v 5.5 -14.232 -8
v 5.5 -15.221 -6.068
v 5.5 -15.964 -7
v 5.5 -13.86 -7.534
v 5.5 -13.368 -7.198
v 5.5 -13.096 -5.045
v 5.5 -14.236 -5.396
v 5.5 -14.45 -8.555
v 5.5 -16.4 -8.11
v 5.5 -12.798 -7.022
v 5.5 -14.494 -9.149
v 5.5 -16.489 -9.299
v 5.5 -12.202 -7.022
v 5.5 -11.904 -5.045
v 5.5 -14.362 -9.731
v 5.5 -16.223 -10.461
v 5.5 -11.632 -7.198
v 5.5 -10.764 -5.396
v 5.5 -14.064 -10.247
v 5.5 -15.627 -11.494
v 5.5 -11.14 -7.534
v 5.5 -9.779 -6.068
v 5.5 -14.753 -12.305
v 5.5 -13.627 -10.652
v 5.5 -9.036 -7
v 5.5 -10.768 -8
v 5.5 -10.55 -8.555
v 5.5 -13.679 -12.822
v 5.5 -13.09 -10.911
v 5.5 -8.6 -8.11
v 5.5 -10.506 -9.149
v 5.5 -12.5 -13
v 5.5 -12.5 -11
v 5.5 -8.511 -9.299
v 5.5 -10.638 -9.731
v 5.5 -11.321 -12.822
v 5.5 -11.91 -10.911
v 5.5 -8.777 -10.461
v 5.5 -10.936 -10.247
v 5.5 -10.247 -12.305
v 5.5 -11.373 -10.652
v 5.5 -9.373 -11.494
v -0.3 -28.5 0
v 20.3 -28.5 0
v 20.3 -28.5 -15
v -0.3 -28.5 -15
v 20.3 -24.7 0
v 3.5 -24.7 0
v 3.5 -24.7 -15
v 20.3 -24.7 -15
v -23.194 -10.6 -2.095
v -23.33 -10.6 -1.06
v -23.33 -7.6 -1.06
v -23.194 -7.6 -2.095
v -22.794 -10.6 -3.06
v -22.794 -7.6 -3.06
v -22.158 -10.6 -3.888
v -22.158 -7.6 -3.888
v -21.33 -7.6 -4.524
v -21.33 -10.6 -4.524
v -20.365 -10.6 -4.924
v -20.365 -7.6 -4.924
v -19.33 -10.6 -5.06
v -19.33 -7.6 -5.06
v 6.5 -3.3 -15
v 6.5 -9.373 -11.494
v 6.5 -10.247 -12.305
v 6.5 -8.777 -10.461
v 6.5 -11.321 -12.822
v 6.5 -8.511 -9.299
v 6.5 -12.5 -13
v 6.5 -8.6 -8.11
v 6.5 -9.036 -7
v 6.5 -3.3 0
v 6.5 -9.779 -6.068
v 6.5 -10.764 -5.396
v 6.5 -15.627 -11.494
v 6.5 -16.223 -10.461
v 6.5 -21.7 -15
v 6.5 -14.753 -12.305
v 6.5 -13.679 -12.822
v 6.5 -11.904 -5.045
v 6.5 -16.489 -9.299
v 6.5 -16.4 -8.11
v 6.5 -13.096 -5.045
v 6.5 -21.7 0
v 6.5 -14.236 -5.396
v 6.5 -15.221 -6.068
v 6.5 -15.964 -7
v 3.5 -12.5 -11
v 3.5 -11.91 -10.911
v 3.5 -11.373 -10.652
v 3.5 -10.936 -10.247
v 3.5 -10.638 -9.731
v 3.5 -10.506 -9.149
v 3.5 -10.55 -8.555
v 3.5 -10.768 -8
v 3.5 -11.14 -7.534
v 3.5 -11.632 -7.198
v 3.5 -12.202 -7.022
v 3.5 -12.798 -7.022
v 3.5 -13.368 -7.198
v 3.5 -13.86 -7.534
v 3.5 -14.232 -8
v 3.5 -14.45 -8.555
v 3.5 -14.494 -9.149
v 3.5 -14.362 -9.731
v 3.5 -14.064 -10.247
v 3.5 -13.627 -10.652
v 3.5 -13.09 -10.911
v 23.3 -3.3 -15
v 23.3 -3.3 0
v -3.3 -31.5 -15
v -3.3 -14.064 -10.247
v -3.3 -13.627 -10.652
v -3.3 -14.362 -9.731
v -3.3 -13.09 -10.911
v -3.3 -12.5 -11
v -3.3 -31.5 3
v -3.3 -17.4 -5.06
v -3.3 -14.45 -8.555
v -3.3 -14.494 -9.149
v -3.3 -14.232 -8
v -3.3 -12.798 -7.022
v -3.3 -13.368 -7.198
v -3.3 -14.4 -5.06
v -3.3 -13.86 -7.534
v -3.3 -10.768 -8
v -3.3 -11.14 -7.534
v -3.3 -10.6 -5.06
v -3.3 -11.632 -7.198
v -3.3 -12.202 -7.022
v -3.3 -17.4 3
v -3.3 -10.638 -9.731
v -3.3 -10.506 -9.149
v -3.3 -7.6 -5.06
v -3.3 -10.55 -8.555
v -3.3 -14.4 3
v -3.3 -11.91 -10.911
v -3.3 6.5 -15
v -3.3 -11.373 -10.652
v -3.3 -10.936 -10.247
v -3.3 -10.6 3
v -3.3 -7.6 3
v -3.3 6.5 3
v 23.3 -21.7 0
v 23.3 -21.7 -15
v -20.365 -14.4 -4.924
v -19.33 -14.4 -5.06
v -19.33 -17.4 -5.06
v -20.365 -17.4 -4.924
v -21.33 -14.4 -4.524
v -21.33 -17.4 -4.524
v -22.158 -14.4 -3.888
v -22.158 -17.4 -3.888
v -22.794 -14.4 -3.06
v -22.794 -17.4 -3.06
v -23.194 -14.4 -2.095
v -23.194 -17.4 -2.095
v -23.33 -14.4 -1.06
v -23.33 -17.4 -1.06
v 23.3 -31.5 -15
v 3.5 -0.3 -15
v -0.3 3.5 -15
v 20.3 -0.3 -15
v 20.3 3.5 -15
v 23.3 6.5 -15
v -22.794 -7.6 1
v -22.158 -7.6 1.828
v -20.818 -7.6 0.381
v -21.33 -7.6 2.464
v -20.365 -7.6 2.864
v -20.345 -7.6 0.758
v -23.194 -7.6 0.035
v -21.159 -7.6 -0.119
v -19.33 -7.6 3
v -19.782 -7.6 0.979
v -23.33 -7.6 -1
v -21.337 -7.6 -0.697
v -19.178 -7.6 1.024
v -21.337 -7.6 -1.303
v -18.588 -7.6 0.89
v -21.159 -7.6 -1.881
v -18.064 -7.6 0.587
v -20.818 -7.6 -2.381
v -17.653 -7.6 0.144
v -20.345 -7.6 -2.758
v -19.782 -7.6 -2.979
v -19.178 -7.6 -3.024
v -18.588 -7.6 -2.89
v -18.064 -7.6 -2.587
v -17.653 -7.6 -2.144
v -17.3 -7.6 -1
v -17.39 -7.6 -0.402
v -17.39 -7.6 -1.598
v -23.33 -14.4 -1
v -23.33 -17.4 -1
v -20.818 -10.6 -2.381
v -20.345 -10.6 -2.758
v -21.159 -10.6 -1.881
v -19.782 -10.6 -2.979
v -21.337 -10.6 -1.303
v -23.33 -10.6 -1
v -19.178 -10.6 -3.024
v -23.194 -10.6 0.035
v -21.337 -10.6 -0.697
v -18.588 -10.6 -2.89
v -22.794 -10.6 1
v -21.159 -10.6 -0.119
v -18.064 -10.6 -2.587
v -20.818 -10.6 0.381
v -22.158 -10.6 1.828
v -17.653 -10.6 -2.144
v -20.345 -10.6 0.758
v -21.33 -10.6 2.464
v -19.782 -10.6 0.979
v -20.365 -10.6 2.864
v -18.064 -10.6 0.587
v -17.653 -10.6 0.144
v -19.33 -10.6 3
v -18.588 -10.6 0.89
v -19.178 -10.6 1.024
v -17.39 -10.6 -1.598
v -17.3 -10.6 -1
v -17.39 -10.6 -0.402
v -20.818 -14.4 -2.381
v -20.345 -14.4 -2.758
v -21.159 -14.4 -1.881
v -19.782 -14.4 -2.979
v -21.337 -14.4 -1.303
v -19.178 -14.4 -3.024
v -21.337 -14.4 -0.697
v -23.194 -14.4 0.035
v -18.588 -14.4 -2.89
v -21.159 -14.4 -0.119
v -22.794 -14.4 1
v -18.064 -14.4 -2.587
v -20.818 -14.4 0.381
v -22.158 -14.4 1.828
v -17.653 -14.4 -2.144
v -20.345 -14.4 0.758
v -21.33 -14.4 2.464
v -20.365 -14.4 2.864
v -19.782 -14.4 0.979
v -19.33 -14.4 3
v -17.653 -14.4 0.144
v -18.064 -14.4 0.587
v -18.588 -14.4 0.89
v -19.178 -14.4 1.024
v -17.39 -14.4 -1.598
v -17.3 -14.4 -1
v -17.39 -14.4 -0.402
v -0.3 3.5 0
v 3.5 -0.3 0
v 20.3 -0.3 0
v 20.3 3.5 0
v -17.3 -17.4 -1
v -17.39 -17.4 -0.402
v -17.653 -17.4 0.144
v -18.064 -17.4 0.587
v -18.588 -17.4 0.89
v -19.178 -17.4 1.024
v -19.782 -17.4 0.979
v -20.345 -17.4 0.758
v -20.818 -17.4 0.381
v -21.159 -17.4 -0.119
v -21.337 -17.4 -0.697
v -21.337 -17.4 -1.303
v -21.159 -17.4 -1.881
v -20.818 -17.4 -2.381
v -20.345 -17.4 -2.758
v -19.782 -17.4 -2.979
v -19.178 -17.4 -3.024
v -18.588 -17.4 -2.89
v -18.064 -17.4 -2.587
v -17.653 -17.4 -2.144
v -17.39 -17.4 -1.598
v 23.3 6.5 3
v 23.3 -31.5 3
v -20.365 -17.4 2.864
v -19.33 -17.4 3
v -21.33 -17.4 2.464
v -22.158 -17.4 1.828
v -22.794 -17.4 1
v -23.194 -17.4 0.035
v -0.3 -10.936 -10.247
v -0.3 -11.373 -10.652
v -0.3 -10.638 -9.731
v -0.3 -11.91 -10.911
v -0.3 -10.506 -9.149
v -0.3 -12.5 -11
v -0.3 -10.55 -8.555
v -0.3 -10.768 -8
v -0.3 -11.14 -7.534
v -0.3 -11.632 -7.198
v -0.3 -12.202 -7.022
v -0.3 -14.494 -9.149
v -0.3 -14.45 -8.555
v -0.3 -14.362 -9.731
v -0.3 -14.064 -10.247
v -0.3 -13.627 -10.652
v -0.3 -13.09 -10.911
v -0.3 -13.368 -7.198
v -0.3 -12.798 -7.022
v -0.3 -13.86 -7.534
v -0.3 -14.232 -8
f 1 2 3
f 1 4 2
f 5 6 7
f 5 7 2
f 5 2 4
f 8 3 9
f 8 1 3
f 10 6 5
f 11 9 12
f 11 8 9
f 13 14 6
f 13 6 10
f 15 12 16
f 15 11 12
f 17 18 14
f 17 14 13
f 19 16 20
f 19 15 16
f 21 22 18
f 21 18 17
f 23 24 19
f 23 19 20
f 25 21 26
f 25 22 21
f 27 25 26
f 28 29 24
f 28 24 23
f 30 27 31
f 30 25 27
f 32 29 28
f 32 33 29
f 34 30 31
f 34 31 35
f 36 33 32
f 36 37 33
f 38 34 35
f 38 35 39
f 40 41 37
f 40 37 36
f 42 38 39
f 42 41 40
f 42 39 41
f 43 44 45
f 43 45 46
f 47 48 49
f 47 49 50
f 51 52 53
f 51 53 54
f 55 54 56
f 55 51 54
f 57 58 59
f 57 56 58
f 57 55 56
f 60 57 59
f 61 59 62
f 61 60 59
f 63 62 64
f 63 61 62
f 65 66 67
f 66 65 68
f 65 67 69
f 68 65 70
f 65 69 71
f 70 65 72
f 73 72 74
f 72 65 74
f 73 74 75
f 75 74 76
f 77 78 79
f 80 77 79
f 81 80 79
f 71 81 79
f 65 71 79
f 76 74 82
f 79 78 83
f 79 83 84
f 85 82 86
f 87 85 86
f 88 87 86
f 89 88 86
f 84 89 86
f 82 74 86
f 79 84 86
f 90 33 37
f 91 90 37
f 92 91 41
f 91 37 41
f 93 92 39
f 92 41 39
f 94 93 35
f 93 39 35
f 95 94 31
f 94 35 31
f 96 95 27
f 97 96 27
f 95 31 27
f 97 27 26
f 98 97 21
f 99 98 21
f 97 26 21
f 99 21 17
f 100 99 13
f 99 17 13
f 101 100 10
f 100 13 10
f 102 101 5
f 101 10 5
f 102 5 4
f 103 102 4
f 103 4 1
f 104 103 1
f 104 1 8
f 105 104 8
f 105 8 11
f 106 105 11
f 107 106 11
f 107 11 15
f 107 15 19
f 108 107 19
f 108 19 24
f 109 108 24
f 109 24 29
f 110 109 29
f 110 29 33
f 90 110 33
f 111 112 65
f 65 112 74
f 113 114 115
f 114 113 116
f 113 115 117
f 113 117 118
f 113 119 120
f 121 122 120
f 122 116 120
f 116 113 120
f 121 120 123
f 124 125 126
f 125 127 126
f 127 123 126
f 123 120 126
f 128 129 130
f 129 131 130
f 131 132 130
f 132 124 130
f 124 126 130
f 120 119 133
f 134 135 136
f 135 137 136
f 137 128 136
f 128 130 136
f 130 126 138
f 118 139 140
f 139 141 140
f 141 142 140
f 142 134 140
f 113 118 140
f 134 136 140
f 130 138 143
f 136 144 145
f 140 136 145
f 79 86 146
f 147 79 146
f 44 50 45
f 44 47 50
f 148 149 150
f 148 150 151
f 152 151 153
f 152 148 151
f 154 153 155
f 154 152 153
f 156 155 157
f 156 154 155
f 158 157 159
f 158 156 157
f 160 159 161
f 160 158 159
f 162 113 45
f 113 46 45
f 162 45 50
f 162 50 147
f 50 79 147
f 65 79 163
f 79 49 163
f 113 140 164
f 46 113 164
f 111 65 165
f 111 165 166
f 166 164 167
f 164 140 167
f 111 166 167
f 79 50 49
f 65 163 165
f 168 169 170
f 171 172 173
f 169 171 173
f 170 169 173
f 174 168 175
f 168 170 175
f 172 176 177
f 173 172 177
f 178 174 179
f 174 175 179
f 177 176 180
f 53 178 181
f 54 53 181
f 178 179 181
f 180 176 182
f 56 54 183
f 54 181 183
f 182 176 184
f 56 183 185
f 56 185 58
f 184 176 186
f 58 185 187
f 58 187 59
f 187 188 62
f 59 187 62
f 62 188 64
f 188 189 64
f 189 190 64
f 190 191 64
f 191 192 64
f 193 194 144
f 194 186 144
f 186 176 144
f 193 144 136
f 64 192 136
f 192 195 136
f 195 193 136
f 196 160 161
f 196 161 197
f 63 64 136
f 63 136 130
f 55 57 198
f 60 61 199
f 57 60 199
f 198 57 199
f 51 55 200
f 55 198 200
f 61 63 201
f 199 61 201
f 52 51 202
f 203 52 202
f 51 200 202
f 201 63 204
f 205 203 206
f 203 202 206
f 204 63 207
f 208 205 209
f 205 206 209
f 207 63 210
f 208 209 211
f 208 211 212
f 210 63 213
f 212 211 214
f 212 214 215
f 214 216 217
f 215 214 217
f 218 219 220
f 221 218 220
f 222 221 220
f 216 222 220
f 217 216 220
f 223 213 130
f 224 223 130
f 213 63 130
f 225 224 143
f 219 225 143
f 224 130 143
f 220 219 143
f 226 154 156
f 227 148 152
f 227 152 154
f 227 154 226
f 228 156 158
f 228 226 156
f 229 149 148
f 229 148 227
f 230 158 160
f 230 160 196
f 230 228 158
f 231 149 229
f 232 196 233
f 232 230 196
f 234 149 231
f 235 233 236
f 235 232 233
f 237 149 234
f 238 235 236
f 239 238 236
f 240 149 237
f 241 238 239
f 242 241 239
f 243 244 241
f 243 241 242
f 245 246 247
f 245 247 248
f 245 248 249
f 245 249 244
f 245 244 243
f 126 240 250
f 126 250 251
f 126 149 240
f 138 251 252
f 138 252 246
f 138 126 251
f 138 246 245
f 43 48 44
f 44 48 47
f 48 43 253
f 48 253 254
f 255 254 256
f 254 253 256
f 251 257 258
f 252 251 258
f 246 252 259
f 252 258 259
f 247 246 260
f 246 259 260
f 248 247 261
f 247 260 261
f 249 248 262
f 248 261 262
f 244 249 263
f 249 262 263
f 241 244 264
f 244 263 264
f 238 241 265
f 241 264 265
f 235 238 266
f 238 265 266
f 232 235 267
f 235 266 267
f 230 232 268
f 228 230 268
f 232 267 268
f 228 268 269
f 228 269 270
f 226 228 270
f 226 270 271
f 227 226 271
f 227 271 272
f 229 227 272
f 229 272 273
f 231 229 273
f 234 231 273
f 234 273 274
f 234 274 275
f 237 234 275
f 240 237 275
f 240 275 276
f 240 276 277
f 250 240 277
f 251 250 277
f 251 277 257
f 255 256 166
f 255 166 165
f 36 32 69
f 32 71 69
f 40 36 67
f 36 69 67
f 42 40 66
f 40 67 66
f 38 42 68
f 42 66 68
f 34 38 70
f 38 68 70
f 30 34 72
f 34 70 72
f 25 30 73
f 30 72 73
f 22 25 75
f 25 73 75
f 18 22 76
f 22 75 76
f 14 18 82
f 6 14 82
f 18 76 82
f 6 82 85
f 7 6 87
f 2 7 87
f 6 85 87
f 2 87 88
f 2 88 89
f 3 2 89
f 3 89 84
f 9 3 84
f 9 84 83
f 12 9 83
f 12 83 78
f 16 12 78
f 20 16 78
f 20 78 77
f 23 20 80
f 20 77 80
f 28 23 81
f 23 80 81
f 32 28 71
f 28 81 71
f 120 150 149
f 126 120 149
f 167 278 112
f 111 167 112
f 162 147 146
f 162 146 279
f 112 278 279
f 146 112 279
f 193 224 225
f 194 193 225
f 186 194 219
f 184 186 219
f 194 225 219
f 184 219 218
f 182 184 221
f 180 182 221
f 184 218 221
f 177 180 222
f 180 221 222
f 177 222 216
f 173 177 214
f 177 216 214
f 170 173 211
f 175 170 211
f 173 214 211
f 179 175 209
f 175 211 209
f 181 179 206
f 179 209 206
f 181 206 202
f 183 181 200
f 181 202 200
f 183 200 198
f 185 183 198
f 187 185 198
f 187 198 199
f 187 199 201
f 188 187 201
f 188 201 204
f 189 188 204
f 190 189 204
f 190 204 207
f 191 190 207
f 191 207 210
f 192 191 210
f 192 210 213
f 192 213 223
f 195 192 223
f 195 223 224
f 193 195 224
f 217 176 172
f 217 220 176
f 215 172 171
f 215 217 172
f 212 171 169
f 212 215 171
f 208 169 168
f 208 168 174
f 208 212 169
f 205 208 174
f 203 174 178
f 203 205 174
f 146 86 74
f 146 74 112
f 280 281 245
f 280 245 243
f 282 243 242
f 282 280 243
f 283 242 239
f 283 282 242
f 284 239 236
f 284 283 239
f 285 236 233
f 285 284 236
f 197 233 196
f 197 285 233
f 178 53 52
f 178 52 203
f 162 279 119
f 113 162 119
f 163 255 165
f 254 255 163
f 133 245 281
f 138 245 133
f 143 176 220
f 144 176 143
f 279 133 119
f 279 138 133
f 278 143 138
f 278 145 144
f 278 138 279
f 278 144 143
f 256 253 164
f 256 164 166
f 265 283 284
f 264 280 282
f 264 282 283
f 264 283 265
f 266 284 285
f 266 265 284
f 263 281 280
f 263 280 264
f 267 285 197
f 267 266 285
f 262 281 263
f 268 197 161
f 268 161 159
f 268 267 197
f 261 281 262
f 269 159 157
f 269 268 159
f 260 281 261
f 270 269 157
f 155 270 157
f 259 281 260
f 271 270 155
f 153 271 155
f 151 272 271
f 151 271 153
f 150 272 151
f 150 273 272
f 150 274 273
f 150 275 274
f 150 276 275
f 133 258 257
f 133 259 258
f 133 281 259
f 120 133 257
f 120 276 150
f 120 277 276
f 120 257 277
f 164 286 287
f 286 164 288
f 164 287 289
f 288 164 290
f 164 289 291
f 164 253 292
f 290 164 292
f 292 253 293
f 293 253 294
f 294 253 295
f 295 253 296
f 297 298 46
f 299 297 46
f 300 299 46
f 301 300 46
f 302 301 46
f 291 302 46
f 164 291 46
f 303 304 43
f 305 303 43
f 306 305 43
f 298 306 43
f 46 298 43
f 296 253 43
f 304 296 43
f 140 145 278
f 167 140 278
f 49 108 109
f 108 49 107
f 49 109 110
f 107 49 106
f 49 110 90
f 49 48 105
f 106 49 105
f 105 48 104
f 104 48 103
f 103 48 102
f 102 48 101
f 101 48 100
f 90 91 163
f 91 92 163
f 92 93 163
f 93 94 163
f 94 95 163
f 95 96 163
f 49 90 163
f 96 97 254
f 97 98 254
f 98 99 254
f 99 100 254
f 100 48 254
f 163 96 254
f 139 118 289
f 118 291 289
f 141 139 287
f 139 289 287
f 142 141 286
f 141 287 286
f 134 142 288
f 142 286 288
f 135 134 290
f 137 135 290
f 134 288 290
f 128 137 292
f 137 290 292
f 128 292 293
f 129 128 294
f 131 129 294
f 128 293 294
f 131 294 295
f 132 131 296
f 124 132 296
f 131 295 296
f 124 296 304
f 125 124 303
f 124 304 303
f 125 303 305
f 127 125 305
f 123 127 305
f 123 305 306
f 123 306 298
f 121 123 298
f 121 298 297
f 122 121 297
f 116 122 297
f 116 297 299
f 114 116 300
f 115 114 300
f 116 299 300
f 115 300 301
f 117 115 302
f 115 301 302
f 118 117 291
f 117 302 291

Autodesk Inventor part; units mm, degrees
ref_plane "YZ Plane" through (0, 0, 0) normal (1, 0, 0) x (0, 1, 0)
ref_plane "XZ Plane" through (0, 0, 0) normal (0, 1, 0) x (-1, 0, 0)
ref_plane "XY Plane" through (0, 0, 0) normal (0, 0, 1) x (1, 0, 0)
sketch "Sketch1" plane through (0, 0, 0) normal (0, 0, 1) x (1, 0, 0)
  line L0 (0, 0) -> (20, 0) projected
  line L1 (20, 0) -> (20, 3.2) projected
  line L2 (0, 3.2) -> (20, 3.2) projected
  line L3 (0, 0) -> (0, 3.2) projected
  line L4 (20, -25) -> (0, -25) projected
  line L5 (0, -25) -> (0, -28.2) projected
  line L6 (20, -28.2) -> (0, -28.2) projected
  line L7 (20, -25) -> (20, -28.2) projected
  line L8 (3.2, -25) -> (3.2, 0) projected
  line L9 (0, -25) -> (0, 0) projected
  line L10 (-0.3, -0.3) -> (-0.3, 3.5)
  line L11 (-0.3, 3.5) -> (20.3, 3.5)
  line L12 (20.3, 3.5) -> (20.3, -0.3)
  line L13 (20.3, -24.7) -> (20.3, -28.5)
  line L14 (20.3, -28.5) -> (-0.3, -28.5)
  line L15 (-0.3, -28.5) -> (-0.3, -24.7)
  line L16 (3.5, -24.7) -> (3.5, -0.3)
  line L17 (-0.3, -0.3) -> (-0.3, -24.7)
  line L18 (20.3, -0.3) -> (3.5, -0.3)
  line L19 (3.5, -24.7) -> (20.3, -24.7)
  line L20 (6.5, -3.3) -> (6.5, -21.7)
  line L21 (6.5, -21.7) -> (23.3, -21.7)
  line L22 (23.3, -21.7) -> (23.3, -31.5)
  line L23 (23.3, -31.5) -> (-3.3, -31.5)
  line L24 (-3.3, -31.5) -> (-3.3, -24.7)
  line L25 (-3.3, -24.7) -> (-3.3, -0.3)
  line L26 (-3.3, -0.3) -> (-3.3, 6.5)
  line L27 (-3.3, 6.5) -> (23.3, 6.5)
  line L28 (23.3, 6.5) -> (23.3, -3.3)
  line L29 (23.3, -3.3) -> (6.5, -3.3)
  dimension "d2" = 0.3
  dimension "d3" = 0.3
  dimension "d4" = 0.3
  dimension "d5" = 24.4
  dimension "d6" = 3.8
  dimension "d7" = 3
extrude "Extrusion1" add sketch "Sketch1" against normal blind 15 contours L20 L21 L22 L23 L24 L25 L26 L27 L28 L29
sketch "Sketch4" plane through (0, 0, 0) normal (0, 0, 1) x (1, 0, 0)
  line L0 (23.3, -3.3) -> (23.3, 6.5) projected
  line L1 (23.3, 6.5) -> (-3.3, 6.5) projected
  line L2 (23.3, -3.3) -> (6.5, -3.3) projected
  line L3 (6.5, -3.3) -> (6.5, -21.7) projected
  line L4 (6.5, -21.7) -> (23.3, -21.7) projected
  line L5 (-3.3, -0.3) -> (-3.3, 6.5) projected
  line L6 (-3.3, -31.5) -> (23.3, -31.5) projected
  line L7 (23.3, -31.5) -> (23.3, -21.7) projected
  line L8 (23.3, -21.7) -> (6.5, -21.7) projected
  line L9 (23.3, 6.5) -> (23.3, -3.3) projected
  line L10 (23.3, -3.3) -> (23.3, 6.5)
  line L11 (-3.3, -31.5) -> (-3.3, 6.5) projected
  line L12 (23.3, 6.5) -> (-3.3, 6.5)
  line L13 (-3.3, 6.5) -> (-3.3, -31.5)
  line L14 (23.3, -31.5) -> (-3.3, -31.5) projected
  line L15 (-3.3, -31.5) -> (23.3, -31.5)
  line L16 (23.3, -21.7) -> (23.3, -31.5) projected
  line L17 (23.3, -31.5) -> (23.3, -21.7)
  line L18 (6.5, -3.3) -> (6.5, -21.7) projected
  line L19 (23.3, -3.3) -> (6.5, -3.3) projected
  line L20 (6.5, -3.3) -> (23.3, -3.3) projected
  line L21 (23.3, -3.3) -> (23.3, -21.7)
  point P0 (0, 0)
extrude "Extrusion3" add sketch "Sketch4" along normal blind 3
sketch "Sketch5" plane through (6.5, -21.7, -15) normal (1, 0, 0) x (0, 0, -1)
  line L0 (0, 18.4) -> (0, 0) projected
  line L1 (-15, 18.4) -> (0, 18.4) projected
  line L2 (-15, 0) -> (0, 0) projected
  line L3 (-15, 0) -> (-15, 18.4) projected
  circle A0 centre (-6, 9.2) radius 2
  circle A1 centre (-6, 9.2) radius 4
  point P0 (-15, 21.7)
  dimension "d14" = 4
  dimension "d15" = 6
  dimension "d16" = 8
  dimension "d17" = 9.2
extrude "Extrusion4" cut sketch "Sketch5" against normal blind 1 contours A1
extrude "Extrusion5" cut sketch "Sketch5" against normal blind 80 contours A0
sketch "Sketch16" plane through (-3.3, -31.5, -15) normal (-1, 0, 0) x (0, 0, 1)
  line L0 (18, 38) -> (18, 0) projected
  line L1 (0, 0) -> (18, 0) projected
  line L2 (18, 0) -> (18, 38) projected
  line L3 (18, 19) -> (0, 19) construction
  line L4 (0, 6.8) -> (0, 31.2) projected
  line L5 (18, 17.1) -> (18, 14.1)
  line L6 (18, 14.1) -> (9.94, 14.1)
  line L7 (9.94, 14.1) -> (9.94, 17.1)
  line L8 (9.94, 17.1) -> (18, 17.1)
  line L9 (18, 20.9) -> (18, 23.9)
  line L10 (18, 23.9) -> (9.94, 23.9)
  line L11 (9.94, 23.9) -> (9.94, 20.9)
  line L12 (9.94, 20.9) -> (18, 20.9)
  point P0 (15, 31.5)
  dimension "d41" = 3
  dimension "d42" = 1.9
  dimension "d43" = 8.06
extrude "Extrusion8" add sketch "Sketch16" along normal blind 20.03
fillet "Fillet1" radius 4 4 edges at (-23.33, -15.9, 3) (-23.33, -9.1, 3) (-23.33, -9.1, -5.06) (-23.33, -15.9, -5.06)
sketch "Sketch17" plane through (-3.3, -17.4, -5.06) normal (0, -1, 0) x (1, 0, 0)
  arc A0 (-16.03, 8.06) -> (-20.03, 4.06) centre (-16.03, 4.06) ccw projected
  circle A1 centre (-16.03, 4.06) radius 2.03
  point P0 (3.3, 5.06)
  dimension "d47" = 4.06
extrude "Extrusion9" cut sketch "Sketch17" against normal blind 20
properties part number "Tope_Carril"
